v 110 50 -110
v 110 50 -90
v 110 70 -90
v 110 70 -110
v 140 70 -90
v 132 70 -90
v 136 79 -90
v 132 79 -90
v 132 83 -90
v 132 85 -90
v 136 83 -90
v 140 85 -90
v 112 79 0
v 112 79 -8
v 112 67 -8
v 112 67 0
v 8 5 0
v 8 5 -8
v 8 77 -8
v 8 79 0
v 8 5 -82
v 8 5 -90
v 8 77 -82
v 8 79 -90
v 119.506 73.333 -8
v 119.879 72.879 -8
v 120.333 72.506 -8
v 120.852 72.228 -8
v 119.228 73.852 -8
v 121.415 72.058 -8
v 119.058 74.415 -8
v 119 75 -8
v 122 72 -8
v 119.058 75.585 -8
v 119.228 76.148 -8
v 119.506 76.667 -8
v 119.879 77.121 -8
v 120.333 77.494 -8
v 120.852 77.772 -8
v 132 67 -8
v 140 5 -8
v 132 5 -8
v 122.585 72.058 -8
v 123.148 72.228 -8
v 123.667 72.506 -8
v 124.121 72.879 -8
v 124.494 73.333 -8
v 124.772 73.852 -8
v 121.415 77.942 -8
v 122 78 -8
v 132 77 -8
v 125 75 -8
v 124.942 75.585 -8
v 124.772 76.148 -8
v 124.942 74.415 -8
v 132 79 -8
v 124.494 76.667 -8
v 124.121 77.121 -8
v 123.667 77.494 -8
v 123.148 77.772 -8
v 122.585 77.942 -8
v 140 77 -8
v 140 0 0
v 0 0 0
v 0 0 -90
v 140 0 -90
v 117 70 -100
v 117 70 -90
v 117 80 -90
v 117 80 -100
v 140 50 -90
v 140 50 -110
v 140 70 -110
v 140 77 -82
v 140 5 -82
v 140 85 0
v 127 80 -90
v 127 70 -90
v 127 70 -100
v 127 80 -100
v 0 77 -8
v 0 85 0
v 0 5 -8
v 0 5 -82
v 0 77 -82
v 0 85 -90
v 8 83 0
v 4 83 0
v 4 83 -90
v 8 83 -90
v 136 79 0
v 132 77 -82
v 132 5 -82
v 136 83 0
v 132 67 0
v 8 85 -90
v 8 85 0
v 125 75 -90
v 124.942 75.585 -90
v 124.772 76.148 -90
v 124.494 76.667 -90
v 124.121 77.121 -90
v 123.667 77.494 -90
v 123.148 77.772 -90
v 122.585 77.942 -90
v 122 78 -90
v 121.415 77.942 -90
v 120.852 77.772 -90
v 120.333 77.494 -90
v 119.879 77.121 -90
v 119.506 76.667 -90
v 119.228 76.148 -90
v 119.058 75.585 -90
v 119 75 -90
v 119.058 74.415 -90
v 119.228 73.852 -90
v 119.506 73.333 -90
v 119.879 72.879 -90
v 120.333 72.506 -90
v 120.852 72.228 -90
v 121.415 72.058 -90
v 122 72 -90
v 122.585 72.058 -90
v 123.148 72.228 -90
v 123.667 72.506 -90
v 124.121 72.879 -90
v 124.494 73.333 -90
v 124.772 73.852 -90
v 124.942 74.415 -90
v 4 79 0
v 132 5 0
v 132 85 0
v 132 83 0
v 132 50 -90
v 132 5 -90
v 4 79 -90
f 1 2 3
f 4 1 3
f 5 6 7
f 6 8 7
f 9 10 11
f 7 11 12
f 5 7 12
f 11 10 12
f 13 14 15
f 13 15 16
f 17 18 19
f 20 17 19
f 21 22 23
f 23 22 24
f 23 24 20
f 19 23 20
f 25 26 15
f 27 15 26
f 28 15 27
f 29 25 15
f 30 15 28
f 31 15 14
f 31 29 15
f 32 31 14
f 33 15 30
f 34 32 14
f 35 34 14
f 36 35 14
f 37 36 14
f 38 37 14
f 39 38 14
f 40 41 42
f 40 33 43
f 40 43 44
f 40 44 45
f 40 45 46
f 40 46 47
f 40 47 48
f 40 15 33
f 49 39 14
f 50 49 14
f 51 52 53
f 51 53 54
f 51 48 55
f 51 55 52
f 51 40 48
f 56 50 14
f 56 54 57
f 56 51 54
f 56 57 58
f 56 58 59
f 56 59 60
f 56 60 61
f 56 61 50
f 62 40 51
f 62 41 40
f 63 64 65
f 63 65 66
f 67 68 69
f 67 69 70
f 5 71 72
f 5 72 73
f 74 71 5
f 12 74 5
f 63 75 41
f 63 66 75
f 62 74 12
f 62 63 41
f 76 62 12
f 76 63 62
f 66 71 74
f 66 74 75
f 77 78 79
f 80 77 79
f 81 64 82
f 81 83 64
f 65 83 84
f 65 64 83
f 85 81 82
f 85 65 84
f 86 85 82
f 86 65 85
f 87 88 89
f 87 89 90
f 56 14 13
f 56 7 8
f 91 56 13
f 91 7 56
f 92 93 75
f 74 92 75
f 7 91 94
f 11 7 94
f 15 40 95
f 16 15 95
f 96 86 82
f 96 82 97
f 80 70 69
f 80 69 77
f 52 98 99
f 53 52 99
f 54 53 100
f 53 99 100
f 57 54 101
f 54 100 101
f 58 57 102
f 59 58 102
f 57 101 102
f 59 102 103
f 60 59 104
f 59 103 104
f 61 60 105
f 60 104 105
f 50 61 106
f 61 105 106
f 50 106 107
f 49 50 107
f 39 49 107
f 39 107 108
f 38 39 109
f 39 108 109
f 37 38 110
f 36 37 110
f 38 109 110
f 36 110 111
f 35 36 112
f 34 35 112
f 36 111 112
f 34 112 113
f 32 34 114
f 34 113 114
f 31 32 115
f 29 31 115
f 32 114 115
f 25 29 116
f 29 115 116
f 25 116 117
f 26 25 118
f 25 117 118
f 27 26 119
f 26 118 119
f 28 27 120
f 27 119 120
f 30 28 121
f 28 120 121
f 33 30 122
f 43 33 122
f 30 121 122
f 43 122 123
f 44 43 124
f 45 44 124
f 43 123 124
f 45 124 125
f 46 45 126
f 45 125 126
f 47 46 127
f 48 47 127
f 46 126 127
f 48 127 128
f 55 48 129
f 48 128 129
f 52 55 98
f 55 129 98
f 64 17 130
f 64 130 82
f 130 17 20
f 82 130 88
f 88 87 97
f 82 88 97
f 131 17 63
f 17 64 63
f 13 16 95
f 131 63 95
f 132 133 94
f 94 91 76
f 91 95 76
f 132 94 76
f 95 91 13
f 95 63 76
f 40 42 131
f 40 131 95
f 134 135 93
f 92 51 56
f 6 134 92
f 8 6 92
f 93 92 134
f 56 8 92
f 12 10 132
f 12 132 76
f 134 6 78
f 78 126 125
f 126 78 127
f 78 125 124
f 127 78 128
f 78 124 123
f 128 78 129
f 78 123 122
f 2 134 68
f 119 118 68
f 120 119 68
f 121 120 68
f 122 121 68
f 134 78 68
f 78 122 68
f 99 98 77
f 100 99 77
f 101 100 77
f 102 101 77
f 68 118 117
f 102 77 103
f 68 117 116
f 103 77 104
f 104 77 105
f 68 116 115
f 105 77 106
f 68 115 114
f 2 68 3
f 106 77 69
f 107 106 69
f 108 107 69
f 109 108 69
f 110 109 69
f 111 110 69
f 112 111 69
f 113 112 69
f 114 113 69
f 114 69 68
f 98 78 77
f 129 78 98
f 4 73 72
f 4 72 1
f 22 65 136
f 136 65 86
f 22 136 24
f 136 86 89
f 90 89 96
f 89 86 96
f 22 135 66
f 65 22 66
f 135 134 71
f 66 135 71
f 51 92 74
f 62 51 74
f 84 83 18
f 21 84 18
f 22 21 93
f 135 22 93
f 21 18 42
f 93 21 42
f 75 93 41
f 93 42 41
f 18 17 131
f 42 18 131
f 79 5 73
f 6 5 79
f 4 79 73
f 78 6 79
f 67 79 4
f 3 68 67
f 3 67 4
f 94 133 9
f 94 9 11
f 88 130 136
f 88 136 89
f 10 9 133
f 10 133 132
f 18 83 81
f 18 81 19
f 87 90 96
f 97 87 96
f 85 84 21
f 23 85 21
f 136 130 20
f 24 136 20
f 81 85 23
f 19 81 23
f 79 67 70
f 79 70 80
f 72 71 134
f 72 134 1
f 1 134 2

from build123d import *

# Parameters (mm, degrees)
SKETCH_1_W          = 140
SKETCH_1_H          = 5
EXTRUDE_1_DEPTH     = 90
SKETCH_2_W          = 8
SKETCH_2_H          = 8
EXTRUDE_2_DEPTH     = 80
EXTRUDE_3_REACH     = 185.164
SKETCH_3_W          = 8
SKETCH_3_H          = 8
SKETCH_4_W          = 4
SKETCH_4_H          = 4
CUT_EXTRUDE_1_DEPTH = 90
SKETCH_5_W          = 30
SKETCH_5_H          = 20
EXTRUDE_4_DEPTH     = 20
SKETCH_6_W          = 10
SKETCH_6_H          = 10
EXTRUDE_5_DEPTH     = 10
SKETCH_7_R          = 3
EXTRUDE_6_DEPTH     = 82
SKETCH_8_W          = 8
SKETCH_8_H          = 12
EXTRUDE_7_DEPTH     = 20


with BuildPart() as part:
    # 草图1 → 凸台-拉伸1 (new body)
    with BuildSketch(Plane.XY):
        with Locations((70, 2.5)):
            Rectangle(SKETCH_1_W, SKETCH_1_H)
    extrude(amount=-EXTRUDE_1_DEPTH)

    # 草图2 → 凸台-拉伸2 (add)
    with BuildSketch(Plane(origin=(0, 5, 0), x_dir=(1, 0, 0), z_dir=(0, 1, 0))):
        with Locations((4, 4)):
            Rectangle(SKETCH_2_W, SKETCH_2_H)
        with Locations((4, 86)):
            Rectangle(SKETCH_2_W, SKETCH_2_H)
        with Locations((136, 86)):
            Rectangle(SKETCH_2_W, SKETCH_2_H)
        with Locations((136, 4)):
            Rectangle(SKETCH_2_W, SKETCH_2_H)
    extrude(amount=EXTRUDE_2_DEPTH)

    # 草图3 → 凸台-拉伸3 (add, up to next)
    with BuildSketch(Plane.XY.offset(-82), mode=Mode.PRIVATE) as extrude_3_sk1:
        with Locations((4, 81)):
            Rectangle(SKETCH_3_W, SKETCH_3_H)
    extrude_3_tool1 = extrude(extrude_3_sk1.sketch, amount=EXTRUDE_3_REACH, mode=Mode.PRIVATE) - part.part
    # 草图3 → 凸台-拉伸3 (add, up to next)
    with BuildSketch(Plane.XY.offset(-82), mode=Mode.PRIVATE) as extrude_3_sk2:
        with Locations((136, 81)):
            Rectangle(SKETCH_3_W, SKETCH_3_H)
    extrude_3_tool2 = extrude(extrude_3_sk2.sketch, amount=EXTRUDE_3_REACH, mode=Mode.PRIVATE) - part.part
    add(extrude_3_tool1.solids().sort_by_distance((4, 81, -82))[0])
    add(extrude_3_tool2.solids().sort_by_distance((136, 81, -82))[0])

    # 草图4 → 切除-拉伸1 (cut)
    with BuildSketch(Plane.XY):
        with Locations((6, 81)):
            Rectangle(SKETCH_4_W, SKETCH_4_H)
        with Locations((134, 81)):
            Rectangle(SKETCH_4_W, SKETCH_4_H)
    extrude(amount=-CUT_EXTRUDE_1_DEPTH, mode=Mode.SUBTRACT)

    # 草图5 → 凸台-拉伸4 (add)
    with BuildSketch(Plane(origin=(0, 0, -90), x_dir=(-1, 0, 0), z_dir=(0, 0, -1))):
        with Locations((-125, 60)):
            Rectangle(SKETCH_5_W, SKETCH_5_H)
    extrude(amount=EXTRUDE_4_DEPTH)

    # 草图6 → 凸台-拉伸5 (add)
    with BuildSketch(Plane(origin=(0, 70, 0), x_dir=(1, 0, 0), z_dir=(0, 1, 0))):
        with Locations((122, 95)):
            Rectangle(SKETCH_6_W, SKETCH_6_H)
    extrude(amount=EXTRUDE_5_DEPTH)

    # 草图7 → 凸台-拉伸6 (add)
    with BuildSketch(Plane.XY.offset(-90)):
        with Locations((122, 75)):
            Circle(SKETCH_7_R)
    extrude(amount=EXTRUDE_6_DEPTH)

    # 草图8 → 凸台-拉伸7 (add)
    with BuildSketch(Plane.ZY.offset(-132)):
        with Locations((-4, 73)):
            Rectangle(SKETCH_8_W, SKETCH_8_H)
    extrude(amount=EXTRUDE_7_DEPTH)


solid = part.part
